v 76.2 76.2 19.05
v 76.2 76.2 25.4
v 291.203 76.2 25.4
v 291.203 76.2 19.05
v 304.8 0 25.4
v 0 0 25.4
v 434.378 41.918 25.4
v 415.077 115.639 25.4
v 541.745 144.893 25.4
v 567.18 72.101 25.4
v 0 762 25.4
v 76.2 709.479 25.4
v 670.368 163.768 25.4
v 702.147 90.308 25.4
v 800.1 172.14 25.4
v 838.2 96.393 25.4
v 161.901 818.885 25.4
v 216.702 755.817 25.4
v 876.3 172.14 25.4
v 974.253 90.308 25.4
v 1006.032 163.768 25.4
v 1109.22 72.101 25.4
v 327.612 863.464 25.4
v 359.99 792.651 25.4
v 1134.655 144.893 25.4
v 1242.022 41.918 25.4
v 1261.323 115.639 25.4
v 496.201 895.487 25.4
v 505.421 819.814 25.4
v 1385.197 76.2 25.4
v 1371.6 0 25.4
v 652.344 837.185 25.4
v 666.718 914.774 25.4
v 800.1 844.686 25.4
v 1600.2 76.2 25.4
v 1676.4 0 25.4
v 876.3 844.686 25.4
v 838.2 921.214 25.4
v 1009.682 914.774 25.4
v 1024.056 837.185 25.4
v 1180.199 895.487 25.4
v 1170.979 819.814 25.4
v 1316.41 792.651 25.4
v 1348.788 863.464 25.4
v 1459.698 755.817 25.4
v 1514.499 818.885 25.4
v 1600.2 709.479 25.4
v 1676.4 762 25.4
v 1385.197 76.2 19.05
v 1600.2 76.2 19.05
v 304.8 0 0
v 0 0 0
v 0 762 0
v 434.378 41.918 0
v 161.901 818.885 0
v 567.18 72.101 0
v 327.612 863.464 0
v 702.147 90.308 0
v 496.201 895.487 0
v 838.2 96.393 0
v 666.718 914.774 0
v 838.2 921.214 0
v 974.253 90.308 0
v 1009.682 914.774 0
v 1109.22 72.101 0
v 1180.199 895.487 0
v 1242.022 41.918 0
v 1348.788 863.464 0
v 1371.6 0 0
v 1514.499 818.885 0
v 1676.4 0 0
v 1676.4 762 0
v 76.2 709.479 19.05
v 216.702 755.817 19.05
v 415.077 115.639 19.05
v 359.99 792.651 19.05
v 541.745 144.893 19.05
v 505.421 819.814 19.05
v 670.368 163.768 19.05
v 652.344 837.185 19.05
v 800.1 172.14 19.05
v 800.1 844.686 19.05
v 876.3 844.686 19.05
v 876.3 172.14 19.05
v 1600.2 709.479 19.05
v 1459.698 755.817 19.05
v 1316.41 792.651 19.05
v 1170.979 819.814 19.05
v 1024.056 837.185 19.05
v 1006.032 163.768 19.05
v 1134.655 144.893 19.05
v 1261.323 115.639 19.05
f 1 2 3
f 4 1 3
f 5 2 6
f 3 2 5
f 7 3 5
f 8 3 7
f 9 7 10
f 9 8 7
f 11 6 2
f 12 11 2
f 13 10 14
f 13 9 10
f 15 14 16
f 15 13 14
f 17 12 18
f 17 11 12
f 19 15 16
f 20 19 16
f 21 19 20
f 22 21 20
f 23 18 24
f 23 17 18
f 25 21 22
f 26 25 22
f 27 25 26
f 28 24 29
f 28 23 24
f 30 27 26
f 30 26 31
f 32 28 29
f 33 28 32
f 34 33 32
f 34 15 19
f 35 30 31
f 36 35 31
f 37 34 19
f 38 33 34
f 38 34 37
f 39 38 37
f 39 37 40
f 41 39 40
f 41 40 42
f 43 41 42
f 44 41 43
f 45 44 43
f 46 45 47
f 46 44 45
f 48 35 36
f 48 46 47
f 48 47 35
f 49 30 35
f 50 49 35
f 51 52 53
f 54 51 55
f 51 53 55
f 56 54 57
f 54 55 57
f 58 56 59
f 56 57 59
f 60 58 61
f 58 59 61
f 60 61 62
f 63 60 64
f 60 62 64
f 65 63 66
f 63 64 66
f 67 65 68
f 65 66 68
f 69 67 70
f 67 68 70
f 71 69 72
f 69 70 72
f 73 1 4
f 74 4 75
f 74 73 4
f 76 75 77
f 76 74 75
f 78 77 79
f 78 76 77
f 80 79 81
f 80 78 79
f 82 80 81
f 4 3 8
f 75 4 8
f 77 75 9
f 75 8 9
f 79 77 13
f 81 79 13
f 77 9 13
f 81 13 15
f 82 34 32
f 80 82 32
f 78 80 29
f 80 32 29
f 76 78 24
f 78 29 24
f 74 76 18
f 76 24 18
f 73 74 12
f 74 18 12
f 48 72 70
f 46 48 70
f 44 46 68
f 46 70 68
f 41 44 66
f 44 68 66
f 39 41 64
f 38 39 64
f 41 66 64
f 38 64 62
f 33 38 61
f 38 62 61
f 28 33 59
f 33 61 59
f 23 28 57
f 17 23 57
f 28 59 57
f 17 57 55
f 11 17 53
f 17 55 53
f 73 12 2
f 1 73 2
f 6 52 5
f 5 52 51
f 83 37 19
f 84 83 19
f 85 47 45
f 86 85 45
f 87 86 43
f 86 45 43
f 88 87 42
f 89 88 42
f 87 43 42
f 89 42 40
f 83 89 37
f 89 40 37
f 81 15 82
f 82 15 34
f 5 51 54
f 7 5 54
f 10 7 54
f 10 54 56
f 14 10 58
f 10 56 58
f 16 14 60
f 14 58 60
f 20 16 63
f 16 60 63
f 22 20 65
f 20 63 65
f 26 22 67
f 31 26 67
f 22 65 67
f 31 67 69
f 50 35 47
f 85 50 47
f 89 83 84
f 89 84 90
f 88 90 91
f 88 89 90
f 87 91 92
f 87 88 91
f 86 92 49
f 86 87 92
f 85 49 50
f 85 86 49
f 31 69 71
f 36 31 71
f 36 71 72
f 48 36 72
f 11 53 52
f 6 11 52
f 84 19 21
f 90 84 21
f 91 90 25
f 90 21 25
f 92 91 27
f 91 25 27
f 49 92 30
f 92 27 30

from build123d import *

# Parameters (mm, degrees)
F1_DEPTH = 25.4
F3_DEPTH = 6.35


with BuildPart() as f1:
    # F0 (on Top) → F1 (new body)
    with BuildSketch(Plane.XY):
        with BuildLine():
            Line((0, 762), (0, 0))
            Line((0, 0), (304.8, 0))
            ThreePointArc((304.8, 0), (838.2, 96.393458), (1371.6, 0))
            Line((1371.6, 0), (1676.4, 0))
            Line((1676.4, 0), (1676.4, 762))
            ThreePointArc((1676.4, 762), (838.2, 921.214454), (0, 762))
        make_face()
    extrude(amount=F1_DEPTH)

    # F2 (on face) → F3 (cut)
    with BuildSketch(Plane.XY.offset(25.4)):
        with BuildLine():
            Line((1385.197187, 76.200001), (1600.199999, 76.200001))
            Line((1600.199999, 76.200001), (1600.199999, 709.47867))
            ThreePointArc((1600.199999, 709.47867), (1243.921895, 807.449657), (876.299999, 844.68598))
            Line((876.299999, 844.68598), (876.299999, 172.139823))
            ThreePointArc((876.299999, 172.139823), (1134.655379, 144.892822), (1385.197187, 76.200001))
        make_face()
        with BuildLine():
            Line((76.200001, 709.47867), (76.200001, 76.200001))
            Line((76.200001, 76.200001), (291.202813, 76.200001))
            ThreePointArc((291.202813, 76.200001), (541.744621, 144.892822), (800.100001, 172.139823))
            Line((800.100001, 172.139823), (800.100001, 844.68598))
            ThreePointArc((800.100001, 844.68598), (432.478105, 807.449657), (76.200001, 709.47867))
        make_face()
    extrude(amount=-F3_DEPTH, mode=Mode.SUBTRACT)


solid = f1.part
